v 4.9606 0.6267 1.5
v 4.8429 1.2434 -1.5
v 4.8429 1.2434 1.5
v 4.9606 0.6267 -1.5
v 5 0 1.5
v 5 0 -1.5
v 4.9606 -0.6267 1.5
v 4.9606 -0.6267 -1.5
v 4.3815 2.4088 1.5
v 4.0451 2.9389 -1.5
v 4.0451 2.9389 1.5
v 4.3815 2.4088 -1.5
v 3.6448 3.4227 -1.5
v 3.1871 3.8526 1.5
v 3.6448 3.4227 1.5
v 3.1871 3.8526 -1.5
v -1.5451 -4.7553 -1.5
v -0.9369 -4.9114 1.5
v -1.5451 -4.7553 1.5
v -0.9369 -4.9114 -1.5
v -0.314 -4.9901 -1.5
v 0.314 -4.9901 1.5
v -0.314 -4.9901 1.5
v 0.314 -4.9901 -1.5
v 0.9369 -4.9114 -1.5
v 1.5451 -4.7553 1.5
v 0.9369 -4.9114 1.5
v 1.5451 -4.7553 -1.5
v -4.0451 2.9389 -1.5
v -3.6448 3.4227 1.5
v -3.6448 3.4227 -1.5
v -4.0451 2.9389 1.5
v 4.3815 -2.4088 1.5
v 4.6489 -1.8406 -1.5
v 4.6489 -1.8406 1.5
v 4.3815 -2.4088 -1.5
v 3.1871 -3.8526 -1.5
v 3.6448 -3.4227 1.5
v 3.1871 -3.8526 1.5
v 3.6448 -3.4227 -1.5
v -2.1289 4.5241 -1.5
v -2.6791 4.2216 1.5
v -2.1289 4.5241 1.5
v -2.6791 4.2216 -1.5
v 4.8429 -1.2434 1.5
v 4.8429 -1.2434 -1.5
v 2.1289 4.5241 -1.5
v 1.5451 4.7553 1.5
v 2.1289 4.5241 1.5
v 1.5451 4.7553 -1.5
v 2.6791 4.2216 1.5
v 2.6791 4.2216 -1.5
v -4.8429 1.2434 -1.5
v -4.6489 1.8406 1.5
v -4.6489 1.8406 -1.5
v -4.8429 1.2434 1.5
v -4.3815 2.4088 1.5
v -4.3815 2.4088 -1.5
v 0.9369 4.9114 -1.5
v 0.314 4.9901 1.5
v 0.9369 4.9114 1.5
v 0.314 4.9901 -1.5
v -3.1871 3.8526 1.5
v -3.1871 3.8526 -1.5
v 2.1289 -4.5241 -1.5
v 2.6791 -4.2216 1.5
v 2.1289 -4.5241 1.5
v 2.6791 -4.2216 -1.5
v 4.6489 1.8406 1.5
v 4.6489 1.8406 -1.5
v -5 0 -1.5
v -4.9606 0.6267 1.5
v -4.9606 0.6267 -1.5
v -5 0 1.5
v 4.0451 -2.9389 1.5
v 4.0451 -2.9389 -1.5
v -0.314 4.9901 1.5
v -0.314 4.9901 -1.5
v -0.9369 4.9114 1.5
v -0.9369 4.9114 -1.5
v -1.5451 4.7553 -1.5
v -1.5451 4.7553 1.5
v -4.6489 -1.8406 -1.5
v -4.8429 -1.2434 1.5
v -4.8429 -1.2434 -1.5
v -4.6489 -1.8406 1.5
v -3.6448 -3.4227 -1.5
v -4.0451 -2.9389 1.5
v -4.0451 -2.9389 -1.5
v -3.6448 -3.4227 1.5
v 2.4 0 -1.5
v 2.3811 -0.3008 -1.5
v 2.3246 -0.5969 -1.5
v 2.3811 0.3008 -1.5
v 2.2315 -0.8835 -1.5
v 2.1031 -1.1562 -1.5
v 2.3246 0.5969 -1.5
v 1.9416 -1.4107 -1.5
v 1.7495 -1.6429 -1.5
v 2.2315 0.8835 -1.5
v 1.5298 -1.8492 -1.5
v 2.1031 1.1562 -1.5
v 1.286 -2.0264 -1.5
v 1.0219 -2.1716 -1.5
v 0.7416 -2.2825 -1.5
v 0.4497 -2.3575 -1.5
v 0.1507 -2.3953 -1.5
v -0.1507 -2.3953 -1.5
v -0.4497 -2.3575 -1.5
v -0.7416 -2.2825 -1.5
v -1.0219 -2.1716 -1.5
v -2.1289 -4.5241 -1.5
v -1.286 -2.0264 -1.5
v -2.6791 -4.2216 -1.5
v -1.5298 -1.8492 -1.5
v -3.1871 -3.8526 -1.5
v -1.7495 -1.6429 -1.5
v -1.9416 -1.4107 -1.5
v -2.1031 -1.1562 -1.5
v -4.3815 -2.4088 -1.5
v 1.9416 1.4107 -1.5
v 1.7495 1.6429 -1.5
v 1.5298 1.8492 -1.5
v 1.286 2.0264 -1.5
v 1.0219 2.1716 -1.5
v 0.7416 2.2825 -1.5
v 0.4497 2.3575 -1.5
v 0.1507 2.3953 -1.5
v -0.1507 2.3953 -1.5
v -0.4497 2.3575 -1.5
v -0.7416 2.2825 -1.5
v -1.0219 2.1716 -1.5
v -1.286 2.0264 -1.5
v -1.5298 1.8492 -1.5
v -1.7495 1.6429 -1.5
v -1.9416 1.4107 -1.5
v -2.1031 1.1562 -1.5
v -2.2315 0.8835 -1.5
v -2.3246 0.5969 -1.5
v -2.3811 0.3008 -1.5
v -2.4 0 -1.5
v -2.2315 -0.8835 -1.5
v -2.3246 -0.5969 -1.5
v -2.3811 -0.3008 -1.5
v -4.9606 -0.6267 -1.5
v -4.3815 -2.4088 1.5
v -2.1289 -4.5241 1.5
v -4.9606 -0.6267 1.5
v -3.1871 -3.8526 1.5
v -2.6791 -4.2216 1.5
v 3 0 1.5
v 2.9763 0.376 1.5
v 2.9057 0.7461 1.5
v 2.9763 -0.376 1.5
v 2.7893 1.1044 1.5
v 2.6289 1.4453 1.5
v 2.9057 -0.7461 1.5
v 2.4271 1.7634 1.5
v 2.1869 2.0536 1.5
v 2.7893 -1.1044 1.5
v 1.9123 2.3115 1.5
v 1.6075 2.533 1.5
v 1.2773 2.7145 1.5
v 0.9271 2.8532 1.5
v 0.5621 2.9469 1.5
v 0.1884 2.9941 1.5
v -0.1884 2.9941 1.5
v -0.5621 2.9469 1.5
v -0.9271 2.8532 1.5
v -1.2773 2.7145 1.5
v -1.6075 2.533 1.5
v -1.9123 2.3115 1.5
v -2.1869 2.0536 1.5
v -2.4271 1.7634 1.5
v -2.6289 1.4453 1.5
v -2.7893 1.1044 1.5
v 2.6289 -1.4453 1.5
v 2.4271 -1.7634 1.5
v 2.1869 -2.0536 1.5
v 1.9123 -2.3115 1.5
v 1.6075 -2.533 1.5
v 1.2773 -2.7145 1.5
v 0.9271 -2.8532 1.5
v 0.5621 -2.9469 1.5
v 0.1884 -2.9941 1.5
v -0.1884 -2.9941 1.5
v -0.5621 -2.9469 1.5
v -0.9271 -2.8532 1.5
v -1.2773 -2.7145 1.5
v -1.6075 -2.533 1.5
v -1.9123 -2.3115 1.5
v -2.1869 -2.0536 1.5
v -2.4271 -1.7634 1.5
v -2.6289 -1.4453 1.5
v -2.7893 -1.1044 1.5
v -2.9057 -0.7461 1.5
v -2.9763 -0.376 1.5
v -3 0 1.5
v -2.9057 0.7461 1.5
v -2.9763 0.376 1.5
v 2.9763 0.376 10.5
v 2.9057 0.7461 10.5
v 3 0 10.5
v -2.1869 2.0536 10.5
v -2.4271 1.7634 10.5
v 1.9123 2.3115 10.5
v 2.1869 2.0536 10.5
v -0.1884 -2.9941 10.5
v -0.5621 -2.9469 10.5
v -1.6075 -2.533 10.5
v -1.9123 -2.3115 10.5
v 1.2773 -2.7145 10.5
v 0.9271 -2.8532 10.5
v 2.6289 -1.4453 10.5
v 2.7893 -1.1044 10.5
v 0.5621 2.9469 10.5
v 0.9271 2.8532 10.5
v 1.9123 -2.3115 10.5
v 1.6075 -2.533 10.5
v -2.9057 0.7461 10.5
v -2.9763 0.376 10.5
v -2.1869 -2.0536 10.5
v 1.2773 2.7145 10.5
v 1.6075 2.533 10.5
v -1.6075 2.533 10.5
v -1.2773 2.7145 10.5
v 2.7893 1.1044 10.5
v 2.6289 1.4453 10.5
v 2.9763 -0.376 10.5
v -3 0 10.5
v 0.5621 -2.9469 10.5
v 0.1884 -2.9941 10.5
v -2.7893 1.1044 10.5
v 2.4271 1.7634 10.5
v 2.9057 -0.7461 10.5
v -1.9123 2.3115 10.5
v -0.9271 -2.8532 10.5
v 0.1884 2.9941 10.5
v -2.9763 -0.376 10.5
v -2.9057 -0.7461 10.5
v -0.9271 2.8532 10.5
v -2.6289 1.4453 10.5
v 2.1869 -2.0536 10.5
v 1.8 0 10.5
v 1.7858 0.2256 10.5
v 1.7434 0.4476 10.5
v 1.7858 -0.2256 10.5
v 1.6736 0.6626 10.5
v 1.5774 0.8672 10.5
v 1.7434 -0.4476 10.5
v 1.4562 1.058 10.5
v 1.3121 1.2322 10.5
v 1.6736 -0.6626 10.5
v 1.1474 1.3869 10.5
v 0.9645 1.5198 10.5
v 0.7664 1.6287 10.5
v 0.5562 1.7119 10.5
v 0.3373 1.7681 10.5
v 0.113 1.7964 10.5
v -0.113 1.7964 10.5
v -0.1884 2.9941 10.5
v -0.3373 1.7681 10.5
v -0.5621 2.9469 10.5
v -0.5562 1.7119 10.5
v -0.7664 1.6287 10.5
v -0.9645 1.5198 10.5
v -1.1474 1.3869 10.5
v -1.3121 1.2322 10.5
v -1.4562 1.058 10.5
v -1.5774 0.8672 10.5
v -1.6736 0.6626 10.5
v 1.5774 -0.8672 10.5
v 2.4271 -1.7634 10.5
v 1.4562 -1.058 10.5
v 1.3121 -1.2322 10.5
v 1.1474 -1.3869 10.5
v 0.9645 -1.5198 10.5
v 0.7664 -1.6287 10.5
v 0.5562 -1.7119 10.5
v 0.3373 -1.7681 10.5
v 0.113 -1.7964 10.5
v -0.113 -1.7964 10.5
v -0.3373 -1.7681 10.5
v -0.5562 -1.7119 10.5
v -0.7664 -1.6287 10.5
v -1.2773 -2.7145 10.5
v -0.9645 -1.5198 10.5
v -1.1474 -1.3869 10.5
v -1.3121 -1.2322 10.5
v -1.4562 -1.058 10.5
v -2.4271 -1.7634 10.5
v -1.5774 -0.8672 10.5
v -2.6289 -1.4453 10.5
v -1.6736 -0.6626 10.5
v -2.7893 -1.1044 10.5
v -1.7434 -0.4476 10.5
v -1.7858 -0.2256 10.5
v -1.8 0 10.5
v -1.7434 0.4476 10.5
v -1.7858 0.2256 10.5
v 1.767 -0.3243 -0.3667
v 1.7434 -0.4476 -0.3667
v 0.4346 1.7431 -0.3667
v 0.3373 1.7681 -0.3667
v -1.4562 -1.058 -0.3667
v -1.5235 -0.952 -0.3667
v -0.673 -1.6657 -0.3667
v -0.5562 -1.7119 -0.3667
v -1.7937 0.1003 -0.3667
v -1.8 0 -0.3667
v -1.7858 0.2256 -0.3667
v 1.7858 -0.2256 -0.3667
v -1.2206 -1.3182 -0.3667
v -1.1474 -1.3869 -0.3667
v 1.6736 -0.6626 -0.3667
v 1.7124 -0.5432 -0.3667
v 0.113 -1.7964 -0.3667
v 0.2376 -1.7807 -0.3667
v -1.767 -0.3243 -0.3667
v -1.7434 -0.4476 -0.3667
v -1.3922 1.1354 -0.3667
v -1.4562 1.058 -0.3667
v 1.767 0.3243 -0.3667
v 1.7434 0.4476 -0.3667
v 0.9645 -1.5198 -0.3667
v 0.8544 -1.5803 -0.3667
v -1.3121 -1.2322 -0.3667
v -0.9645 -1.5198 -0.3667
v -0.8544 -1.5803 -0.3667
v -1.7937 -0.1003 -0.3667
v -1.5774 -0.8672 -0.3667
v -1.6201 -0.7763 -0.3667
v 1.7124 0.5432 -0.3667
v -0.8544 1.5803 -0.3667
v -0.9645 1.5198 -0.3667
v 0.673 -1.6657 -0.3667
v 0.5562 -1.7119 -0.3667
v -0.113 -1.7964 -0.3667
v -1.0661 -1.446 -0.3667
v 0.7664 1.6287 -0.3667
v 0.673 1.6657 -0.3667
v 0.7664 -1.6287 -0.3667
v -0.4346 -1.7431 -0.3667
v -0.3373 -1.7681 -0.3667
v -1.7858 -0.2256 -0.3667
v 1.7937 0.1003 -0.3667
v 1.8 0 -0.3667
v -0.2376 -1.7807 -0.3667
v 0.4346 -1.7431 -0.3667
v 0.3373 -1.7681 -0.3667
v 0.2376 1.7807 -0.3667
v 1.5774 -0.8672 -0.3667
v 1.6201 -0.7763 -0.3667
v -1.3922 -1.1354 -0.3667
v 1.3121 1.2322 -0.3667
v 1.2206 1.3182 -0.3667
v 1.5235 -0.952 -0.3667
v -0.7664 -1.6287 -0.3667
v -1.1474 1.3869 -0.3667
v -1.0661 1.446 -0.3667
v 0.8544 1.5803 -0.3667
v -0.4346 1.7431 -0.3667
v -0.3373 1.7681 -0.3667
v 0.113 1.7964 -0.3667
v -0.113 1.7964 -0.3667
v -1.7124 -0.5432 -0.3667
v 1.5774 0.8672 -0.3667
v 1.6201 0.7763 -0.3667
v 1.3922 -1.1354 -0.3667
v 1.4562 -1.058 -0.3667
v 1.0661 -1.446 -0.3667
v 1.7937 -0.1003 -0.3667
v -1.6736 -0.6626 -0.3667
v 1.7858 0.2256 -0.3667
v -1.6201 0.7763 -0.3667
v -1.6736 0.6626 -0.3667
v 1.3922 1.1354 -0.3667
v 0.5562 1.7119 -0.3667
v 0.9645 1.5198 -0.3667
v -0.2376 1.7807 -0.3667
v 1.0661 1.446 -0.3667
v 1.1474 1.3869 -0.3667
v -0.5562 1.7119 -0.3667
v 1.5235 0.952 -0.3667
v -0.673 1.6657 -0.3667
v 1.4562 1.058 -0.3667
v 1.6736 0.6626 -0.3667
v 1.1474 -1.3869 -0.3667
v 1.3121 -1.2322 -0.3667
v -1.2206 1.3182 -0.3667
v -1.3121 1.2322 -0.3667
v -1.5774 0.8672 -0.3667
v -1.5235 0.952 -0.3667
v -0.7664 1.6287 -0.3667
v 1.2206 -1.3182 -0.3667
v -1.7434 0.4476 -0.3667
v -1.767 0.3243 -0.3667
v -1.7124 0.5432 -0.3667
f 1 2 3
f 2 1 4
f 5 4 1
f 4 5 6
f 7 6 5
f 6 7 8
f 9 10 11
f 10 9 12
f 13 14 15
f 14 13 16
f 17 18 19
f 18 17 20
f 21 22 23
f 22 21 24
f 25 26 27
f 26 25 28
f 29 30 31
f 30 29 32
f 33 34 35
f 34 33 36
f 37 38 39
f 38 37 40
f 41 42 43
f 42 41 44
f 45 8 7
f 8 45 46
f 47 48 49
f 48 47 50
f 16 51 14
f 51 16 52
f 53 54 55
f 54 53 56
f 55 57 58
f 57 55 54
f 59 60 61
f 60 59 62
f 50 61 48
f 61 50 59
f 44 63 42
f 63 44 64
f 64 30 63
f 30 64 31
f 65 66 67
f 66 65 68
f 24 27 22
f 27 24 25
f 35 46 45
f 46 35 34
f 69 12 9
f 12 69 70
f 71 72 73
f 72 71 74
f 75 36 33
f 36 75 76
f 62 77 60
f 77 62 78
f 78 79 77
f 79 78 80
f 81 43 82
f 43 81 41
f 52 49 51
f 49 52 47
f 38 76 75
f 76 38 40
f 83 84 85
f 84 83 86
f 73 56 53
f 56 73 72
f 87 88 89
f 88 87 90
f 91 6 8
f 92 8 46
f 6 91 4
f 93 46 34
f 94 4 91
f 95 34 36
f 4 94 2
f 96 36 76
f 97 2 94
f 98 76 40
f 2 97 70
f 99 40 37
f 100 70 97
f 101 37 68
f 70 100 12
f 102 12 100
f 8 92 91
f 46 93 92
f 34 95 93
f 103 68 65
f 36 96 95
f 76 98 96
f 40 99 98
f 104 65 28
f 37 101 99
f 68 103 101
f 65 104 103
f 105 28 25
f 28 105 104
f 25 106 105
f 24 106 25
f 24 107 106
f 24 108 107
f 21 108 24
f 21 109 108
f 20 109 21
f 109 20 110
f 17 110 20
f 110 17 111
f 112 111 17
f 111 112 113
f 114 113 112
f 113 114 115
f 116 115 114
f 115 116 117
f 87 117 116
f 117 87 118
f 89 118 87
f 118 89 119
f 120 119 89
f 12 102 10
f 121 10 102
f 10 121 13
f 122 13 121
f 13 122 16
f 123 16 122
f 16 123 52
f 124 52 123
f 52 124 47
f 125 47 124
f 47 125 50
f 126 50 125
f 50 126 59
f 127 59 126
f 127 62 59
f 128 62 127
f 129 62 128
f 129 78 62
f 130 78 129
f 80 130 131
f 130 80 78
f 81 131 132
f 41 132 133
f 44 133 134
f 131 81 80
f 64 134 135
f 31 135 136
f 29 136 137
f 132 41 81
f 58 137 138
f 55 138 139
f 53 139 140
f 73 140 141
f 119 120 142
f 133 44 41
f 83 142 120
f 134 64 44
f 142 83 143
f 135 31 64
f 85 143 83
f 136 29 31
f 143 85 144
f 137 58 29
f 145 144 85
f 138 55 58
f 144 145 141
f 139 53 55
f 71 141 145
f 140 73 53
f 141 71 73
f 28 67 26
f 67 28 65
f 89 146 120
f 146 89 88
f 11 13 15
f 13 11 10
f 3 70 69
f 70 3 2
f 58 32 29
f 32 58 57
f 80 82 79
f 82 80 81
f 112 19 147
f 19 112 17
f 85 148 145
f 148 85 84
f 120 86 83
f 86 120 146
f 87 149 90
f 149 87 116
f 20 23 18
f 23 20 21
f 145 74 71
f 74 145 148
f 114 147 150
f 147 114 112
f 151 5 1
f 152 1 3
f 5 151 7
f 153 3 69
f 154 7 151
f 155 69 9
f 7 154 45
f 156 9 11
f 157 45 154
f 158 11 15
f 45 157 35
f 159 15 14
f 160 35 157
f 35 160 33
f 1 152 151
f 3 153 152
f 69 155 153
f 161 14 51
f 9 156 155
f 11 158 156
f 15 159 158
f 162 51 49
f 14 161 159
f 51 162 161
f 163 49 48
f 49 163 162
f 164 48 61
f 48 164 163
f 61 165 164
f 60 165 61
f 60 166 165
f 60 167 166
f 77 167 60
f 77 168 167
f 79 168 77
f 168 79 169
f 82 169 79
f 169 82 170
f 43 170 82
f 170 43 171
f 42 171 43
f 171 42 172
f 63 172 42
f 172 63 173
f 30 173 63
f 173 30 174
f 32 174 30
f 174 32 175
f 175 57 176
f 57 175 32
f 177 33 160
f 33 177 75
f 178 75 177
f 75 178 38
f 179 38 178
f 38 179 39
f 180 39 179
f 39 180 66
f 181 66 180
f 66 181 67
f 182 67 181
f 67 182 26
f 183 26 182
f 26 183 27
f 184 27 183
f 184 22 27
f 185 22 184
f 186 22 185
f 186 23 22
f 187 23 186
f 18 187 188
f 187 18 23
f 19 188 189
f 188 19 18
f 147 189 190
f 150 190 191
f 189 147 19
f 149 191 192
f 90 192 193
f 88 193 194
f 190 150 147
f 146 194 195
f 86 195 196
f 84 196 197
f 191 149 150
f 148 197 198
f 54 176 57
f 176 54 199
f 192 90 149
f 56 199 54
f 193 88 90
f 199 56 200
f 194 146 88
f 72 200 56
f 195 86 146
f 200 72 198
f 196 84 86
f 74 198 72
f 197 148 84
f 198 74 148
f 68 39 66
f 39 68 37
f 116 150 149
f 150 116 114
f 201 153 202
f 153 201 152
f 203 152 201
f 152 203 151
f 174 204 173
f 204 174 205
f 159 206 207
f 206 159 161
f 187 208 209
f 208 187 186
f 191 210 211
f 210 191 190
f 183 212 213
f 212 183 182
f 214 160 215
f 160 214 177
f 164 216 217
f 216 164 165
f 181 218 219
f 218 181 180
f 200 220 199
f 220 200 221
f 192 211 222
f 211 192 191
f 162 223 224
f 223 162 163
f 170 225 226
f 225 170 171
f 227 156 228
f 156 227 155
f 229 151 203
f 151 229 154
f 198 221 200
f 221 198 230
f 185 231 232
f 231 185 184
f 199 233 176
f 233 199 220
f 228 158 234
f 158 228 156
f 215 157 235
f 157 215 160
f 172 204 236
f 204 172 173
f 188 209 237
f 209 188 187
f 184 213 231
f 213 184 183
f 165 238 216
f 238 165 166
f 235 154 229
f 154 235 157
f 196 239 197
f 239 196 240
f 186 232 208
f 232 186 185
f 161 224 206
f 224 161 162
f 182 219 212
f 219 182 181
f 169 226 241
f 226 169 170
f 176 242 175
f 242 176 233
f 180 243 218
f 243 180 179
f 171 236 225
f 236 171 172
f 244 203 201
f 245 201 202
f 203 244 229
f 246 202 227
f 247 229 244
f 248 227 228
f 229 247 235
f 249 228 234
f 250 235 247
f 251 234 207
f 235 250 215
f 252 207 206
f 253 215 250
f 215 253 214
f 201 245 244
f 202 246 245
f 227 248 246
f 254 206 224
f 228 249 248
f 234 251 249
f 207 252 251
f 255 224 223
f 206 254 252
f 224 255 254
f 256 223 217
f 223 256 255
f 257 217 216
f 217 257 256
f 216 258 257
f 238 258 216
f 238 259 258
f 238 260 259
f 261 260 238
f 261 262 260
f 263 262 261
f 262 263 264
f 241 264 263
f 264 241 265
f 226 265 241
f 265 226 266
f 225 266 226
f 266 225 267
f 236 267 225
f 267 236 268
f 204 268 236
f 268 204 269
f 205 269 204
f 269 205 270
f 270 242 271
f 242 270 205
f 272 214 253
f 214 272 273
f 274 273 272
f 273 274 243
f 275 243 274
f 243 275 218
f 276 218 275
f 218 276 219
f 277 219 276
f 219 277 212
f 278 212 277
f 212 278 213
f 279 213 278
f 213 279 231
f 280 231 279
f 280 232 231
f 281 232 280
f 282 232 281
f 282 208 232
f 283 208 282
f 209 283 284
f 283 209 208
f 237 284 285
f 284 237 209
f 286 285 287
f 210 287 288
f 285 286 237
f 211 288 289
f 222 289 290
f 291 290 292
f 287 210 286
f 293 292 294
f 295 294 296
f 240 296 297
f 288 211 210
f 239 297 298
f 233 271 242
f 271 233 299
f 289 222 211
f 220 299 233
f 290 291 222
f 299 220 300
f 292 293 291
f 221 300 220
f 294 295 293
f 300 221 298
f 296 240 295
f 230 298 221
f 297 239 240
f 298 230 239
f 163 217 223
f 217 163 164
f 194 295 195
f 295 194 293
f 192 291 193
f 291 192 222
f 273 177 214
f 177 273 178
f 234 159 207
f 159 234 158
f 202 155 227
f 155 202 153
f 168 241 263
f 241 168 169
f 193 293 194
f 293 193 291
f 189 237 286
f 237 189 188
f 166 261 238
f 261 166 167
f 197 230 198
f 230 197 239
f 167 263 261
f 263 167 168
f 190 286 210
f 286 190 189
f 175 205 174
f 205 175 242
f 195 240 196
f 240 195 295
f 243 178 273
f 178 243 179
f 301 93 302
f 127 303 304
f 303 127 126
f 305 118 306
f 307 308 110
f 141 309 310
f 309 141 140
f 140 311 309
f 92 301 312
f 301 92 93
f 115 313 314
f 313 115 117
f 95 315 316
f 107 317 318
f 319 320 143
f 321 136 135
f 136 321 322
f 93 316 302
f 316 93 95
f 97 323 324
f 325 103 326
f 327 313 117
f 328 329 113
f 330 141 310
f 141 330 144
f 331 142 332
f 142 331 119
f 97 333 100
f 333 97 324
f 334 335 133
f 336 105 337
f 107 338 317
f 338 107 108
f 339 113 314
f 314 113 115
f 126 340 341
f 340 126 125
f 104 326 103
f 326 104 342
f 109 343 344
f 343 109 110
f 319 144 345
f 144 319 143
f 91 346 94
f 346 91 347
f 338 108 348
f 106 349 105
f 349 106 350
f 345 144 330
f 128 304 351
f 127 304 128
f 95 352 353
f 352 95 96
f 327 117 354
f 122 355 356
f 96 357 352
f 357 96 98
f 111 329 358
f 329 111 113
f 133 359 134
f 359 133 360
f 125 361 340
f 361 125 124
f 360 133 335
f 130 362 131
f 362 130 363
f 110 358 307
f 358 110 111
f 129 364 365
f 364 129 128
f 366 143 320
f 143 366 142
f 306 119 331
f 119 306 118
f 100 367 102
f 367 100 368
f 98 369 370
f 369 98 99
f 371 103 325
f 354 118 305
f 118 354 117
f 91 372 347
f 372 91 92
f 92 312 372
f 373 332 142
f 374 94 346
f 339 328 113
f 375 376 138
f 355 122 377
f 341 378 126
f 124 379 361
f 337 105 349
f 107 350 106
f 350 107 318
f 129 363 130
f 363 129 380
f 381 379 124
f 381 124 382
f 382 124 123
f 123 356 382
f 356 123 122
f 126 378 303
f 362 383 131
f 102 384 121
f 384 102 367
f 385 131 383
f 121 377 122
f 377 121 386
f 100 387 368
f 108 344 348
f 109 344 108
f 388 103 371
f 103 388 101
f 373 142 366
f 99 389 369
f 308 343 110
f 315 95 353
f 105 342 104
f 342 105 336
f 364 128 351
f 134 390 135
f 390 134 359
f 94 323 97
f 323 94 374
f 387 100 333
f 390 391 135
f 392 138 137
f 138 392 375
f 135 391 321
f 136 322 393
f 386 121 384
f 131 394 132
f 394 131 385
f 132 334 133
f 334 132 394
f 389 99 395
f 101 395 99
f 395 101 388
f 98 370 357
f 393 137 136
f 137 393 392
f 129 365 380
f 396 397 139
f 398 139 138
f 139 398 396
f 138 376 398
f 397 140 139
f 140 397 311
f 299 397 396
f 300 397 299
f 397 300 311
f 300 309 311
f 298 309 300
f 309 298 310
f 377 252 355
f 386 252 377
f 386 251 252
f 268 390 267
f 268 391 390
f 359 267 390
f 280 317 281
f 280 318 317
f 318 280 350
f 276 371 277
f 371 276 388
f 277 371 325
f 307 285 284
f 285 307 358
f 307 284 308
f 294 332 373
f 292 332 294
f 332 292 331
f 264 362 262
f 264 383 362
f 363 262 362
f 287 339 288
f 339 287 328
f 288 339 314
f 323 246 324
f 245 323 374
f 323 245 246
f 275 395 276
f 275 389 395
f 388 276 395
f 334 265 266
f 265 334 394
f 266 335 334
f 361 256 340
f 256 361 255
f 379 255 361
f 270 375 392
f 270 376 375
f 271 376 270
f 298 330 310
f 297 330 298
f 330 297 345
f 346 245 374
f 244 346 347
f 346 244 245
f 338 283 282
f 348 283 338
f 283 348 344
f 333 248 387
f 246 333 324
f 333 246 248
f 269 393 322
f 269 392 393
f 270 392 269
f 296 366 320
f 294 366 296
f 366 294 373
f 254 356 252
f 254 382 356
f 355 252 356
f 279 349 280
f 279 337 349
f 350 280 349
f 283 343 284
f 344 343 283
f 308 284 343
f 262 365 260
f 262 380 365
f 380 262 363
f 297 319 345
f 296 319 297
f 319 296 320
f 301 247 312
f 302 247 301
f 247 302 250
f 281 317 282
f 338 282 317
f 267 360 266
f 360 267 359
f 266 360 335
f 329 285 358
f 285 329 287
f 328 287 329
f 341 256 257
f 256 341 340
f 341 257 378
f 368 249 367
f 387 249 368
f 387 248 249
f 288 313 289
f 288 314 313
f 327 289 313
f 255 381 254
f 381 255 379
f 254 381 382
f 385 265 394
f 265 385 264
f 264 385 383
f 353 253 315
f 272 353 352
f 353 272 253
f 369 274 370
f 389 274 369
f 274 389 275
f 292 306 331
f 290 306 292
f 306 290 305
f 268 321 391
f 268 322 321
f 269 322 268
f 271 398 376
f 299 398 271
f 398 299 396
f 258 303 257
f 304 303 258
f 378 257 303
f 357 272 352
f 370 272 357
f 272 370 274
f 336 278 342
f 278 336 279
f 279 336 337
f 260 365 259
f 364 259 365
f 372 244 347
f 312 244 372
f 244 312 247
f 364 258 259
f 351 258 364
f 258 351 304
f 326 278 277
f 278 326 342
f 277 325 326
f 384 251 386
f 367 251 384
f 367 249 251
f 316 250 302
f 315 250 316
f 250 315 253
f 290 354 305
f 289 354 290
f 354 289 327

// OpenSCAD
$fn = 50;


difference() {
	union() {
		translate(v = [0, 0, -1.5000000000]) {
			cylinder(h = 3, r = 5.0000000000);
		}
		translate(v = [0, 0, -1.5000000000]) {
			cylinder(h = 12, r = 3.0000000000);
		}
	}
	union() {
		translate(v = [0, 0, -1.5000000000]) {
			rotate(a = [0, 180, 0]) {
				difference() {
					union() {
						translate(v = [0, 0, -1.7000000000]) {
							cylinder(h = 1.7000000000, r1 = 1.5000000000, r2 = 2.4000000000);
						}
						translate(v = [0, 0, -12.0000000000]) {
							cylinder(h = 12, r = 1.5000000000);
						}
						translate(v = [0, 0, -12.0000000000]) {
							cylinder(h = 12, r = 1.8000000000);
						}
						translate(v = [0, 0, -12.0000000000]) {
							cylinder(h = 12, r = 1.5000000000);
						}
					}
					union();
				}
			}
		}
		translate(v = [0, 0, -100.0000000000]) {
			cylinder(h = 200, r = 1.5000000000);
		}
	}
}
